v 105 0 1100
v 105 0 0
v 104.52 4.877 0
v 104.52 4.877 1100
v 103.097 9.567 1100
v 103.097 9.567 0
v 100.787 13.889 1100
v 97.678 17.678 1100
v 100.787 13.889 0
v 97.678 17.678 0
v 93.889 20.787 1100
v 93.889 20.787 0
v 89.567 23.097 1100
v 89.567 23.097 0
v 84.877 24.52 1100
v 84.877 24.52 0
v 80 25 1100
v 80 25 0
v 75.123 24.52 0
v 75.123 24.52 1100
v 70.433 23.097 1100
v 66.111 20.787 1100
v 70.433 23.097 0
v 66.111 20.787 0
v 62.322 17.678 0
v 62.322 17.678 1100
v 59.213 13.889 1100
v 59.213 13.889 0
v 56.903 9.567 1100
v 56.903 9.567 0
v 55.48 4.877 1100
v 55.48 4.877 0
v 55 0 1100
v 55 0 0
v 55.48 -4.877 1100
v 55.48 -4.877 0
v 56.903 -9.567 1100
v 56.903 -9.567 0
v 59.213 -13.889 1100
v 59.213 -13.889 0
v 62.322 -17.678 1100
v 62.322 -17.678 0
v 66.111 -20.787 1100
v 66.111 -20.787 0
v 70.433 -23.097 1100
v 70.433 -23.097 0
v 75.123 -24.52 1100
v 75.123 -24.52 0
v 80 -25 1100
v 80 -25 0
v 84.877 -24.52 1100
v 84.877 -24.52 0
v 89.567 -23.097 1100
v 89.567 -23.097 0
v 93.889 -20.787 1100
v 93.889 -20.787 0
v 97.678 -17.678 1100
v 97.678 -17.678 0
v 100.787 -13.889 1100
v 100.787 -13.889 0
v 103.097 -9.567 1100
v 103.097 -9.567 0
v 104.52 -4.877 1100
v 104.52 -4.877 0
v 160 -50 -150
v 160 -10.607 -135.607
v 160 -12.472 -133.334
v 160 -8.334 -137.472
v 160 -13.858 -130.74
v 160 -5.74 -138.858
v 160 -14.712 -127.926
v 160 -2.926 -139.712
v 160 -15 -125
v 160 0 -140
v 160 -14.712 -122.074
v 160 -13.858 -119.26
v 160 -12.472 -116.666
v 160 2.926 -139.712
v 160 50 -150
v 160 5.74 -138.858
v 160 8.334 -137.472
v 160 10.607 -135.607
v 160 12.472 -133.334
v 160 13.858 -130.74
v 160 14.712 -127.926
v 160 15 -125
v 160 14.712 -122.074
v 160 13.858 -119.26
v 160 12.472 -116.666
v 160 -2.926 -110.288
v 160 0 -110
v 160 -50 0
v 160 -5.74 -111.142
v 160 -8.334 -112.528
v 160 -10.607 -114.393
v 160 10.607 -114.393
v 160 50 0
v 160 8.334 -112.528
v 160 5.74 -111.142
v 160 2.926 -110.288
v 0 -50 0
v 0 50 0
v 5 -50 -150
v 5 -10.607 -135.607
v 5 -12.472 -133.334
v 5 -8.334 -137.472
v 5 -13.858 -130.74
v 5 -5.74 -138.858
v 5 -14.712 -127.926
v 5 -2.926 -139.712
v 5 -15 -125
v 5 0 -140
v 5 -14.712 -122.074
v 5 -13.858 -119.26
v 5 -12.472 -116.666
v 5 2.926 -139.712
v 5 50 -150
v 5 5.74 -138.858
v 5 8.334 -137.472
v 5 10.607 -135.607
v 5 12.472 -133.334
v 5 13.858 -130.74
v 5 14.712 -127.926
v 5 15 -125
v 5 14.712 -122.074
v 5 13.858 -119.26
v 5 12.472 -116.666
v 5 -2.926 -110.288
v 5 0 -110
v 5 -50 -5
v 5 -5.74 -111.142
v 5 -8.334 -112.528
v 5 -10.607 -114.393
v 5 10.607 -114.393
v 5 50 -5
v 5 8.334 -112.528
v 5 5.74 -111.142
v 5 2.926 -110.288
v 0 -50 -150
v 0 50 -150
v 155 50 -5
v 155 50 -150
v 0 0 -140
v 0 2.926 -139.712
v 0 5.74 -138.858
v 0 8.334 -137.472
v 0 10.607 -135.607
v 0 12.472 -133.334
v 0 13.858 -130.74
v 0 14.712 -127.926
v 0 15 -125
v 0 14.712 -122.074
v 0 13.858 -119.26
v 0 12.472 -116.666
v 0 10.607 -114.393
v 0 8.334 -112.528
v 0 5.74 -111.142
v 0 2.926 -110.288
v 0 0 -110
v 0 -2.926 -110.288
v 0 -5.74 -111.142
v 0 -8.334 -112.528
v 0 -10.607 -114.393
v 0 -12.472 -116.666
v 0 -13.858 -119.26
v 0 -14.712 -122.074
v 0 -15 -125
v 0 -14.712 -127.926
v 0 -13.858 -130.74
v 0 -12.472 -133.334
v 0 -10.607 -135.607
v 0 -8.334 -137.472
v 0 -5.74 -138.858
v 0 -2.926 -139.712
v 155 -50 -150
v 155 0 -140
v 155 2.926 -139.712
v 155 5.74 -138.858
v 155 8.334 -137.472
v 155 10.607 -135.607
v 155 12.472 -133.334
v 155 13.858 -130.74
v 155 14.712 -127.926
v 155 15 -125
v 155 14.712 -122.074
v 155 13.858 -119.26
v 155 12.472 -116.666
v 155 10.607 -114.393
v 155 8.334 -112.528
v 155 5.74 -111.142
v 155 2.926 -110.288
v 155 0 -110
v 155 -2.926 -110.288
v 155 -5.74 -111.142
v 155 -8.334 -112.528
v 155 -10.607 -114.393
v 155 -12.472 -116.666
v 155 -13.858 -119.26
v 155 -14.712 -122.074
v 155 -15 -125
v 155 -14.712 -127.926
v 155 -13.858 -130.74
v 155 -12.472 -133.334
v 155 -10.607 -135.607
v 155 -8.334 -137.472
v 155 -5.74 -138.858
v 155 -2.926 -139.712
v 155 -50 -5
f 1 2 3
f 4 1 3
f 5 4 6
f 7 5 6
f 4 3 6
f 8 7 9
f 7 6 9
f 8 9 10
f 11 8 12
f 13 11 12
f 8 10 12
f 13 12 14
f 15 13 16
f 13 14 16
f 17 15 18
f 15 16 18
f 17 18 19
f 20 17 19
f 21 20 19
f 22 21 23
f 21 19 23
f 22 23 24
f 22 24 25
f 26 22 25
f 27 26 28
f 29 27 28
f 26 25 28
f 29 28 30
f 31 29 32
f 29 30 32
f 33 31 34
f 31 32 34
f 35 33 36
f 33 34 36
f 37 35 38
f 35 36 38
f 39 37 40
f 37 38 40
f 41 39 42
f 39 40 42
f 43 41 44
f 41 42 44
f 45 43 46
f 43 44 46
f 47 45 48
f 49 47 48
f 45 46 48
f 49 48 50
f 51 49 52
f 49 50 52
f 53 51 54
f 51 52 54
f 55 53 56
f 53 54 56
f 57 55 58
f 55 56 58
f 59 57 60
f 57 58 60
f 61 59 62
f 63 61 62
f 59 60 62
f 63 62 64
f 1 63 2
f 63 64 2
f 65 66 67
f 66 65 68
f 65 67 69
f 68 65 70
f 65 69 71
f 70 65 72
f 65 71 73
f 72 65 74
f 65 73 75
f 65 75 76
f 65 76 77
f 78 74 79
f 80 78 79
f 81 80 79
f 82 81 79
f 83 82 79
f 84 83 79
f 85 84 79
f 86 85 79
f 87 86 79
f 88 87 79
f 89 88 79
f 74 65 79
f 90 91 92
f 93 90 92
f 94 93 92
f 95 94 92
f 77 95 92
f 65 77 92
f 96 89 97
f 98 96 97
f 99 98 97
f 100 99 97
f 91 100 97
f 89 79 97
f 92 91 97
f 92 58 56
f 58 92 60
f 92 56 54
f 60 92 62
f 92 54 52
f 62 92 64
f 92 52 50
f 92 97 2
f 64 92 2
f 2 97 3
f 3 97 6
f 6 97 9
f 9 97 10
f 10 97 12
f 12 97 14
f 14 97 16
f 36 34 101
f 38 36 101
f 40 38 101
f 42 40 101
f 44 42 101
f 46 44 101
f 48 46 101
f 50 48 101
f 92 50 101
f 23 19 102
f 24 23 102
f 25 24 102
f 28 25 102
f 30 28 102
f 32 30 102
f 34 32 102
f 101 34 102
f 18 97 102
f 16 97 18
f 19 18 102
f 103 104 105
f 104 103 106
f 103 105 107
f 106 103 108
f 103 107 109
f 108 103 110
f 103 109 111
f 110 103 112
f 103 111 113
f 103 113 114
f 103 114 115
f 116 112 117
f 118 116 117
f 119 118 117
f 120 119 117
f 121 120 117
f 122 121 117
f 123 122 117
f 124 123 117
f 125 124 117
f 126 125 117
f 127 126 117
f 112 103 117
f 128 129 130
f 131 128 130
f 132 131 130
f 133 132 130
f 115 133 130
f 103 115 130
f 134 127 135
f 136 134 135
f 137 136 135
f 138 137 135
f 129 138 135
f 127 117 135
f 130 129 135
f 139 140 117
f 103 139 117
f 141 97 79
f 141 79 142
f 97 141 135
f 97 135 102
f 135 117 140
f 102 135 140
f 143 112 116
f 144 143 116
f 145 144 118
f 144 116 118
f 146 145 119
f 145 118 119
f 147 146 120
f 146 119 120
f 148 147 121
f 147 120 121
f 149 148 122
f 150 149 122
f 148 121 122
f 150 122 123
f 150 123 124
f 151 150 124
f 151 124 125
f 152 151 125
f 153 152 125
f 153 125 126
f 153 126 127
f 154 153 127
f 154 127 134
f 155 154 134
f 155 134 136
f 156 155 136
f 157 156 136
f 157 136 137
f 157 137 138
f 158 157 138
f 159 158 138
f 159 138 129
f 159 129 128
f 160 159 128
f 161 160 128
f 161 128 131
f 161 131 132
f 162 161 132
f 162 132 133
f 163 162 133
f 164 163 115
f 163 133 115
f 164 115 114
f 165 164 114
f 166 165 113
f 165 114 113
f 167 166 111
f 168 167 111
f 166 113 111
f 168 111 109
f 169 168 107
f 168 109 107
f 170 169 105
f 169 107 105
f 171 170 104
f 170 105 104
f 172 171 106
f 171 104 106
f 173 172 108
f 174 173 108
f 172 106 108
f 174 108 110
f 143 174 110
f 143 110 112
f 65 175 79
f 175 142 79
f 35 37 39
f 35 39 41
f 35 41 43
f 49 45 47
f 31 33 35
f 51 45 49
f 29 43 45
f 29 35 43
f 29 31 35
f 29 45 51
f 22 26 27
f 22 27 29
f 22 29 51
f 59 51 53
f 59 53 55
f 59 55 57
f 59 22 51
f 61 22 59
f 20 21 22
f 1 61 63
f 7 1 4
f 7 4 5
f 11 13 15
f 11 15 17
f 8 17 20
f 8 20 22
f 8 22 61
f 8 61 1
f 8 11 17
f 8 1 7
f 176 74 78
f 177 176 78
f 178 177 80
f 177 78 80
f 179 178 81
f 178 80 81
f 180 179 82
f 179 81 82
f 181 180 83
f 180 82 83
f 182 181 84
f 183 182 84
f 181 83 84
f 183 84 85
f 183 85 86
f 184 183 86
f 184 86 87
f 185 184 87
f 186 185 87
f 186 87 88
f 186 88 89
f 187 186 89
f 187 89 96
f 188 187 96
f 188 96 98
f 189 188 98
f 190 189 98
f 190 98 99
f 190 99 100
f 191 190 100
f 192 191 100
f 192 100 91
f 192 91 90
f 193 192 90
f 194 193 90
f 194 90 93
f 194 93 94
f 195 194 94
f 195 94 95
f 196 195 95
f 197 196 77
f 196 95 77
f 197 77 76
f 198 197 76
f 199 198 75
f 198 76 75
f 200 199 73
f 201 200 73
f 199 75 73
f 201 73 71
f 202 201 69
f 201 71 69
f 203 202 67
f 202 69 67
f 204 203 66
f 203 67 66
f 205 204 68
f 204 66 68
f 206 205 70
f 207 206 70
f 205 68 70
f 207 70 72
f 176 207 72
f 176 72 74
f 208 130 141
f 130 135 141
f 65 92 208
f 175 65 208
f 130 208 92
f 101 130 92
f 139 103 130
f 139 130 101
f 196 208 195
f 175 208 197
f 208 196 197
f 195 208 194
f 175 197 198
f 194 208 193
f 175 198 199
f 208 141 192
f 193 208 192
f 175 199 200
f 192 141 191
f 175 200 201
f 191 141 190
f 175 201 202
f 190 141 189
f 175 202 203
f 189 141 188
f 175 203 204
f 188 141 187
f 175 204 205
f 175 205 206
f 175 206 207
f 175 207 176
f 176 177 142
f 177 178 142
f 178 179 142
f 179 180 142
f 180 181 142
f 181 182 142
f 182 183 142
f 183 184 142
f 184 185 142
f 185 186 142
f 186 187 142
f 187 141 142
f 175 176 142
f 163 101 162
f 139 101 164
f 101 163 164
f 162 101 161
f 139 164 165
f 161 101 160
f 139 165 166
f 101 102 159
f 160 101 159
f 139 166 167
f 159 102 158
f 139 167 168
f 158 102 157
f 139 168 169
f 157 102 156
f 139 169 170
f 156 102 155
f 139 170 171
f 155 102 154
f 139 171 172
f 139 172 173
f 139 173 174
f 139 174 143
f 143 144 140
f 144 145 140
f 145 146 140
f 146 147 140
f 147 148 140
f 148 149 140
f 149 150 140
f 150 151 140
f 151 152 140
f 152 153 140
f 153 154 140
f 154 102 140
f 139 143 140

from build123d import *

# Parameters (mm, degrees)
BOSS_EXTRUDE3_DEPTH = 50
SKETCH4_R           = 25
BOSS_EXTRUDE4_DEPTH = 1100
SKETCH5_R           = 15
CUT_EXTRUDE1_DEPTH  = 161


with BuildPart() as part:
    # Sketch1 → Boss-Extrude3 (new body, symmetric)
    with BuildSketch(Plane(origin=(0, 0, 0), x_dir=(1, 0, 0), z_dir=(0, 1, 0))):
        Polygon((5, 150), (5, 5), (155, 5), (155, 150), (160, 150), (160, 0), (0, 0), (0, 150), align=None)
    extrude(amount=BOSS_EXTRUDE3_DEPTH, both=True)

    # Sketch4 → Boss-Extrude4 (add)
    with BuildSketch(Plane.XY):
        with Locations((80, 0)):
            Circle(SKETCH4_R)
    extrude(amount=BOSS_EXTRUDE4_DEPTH)

    # Sketch5 → Cut-Extrude1 (cut, through all)
    with BuildSketch(Plane(origin=(160, 0, 0), x_dir=(0, 0, -1), z_dir=(1, 0, 0))):
        with Locations((125, 0)):
            Circle(SKETCH5_R)
    extrude(amount=-CUT_EXTRUDE1_DEPTH, mode=Mode.SUBTRACT)


solid = part.part
